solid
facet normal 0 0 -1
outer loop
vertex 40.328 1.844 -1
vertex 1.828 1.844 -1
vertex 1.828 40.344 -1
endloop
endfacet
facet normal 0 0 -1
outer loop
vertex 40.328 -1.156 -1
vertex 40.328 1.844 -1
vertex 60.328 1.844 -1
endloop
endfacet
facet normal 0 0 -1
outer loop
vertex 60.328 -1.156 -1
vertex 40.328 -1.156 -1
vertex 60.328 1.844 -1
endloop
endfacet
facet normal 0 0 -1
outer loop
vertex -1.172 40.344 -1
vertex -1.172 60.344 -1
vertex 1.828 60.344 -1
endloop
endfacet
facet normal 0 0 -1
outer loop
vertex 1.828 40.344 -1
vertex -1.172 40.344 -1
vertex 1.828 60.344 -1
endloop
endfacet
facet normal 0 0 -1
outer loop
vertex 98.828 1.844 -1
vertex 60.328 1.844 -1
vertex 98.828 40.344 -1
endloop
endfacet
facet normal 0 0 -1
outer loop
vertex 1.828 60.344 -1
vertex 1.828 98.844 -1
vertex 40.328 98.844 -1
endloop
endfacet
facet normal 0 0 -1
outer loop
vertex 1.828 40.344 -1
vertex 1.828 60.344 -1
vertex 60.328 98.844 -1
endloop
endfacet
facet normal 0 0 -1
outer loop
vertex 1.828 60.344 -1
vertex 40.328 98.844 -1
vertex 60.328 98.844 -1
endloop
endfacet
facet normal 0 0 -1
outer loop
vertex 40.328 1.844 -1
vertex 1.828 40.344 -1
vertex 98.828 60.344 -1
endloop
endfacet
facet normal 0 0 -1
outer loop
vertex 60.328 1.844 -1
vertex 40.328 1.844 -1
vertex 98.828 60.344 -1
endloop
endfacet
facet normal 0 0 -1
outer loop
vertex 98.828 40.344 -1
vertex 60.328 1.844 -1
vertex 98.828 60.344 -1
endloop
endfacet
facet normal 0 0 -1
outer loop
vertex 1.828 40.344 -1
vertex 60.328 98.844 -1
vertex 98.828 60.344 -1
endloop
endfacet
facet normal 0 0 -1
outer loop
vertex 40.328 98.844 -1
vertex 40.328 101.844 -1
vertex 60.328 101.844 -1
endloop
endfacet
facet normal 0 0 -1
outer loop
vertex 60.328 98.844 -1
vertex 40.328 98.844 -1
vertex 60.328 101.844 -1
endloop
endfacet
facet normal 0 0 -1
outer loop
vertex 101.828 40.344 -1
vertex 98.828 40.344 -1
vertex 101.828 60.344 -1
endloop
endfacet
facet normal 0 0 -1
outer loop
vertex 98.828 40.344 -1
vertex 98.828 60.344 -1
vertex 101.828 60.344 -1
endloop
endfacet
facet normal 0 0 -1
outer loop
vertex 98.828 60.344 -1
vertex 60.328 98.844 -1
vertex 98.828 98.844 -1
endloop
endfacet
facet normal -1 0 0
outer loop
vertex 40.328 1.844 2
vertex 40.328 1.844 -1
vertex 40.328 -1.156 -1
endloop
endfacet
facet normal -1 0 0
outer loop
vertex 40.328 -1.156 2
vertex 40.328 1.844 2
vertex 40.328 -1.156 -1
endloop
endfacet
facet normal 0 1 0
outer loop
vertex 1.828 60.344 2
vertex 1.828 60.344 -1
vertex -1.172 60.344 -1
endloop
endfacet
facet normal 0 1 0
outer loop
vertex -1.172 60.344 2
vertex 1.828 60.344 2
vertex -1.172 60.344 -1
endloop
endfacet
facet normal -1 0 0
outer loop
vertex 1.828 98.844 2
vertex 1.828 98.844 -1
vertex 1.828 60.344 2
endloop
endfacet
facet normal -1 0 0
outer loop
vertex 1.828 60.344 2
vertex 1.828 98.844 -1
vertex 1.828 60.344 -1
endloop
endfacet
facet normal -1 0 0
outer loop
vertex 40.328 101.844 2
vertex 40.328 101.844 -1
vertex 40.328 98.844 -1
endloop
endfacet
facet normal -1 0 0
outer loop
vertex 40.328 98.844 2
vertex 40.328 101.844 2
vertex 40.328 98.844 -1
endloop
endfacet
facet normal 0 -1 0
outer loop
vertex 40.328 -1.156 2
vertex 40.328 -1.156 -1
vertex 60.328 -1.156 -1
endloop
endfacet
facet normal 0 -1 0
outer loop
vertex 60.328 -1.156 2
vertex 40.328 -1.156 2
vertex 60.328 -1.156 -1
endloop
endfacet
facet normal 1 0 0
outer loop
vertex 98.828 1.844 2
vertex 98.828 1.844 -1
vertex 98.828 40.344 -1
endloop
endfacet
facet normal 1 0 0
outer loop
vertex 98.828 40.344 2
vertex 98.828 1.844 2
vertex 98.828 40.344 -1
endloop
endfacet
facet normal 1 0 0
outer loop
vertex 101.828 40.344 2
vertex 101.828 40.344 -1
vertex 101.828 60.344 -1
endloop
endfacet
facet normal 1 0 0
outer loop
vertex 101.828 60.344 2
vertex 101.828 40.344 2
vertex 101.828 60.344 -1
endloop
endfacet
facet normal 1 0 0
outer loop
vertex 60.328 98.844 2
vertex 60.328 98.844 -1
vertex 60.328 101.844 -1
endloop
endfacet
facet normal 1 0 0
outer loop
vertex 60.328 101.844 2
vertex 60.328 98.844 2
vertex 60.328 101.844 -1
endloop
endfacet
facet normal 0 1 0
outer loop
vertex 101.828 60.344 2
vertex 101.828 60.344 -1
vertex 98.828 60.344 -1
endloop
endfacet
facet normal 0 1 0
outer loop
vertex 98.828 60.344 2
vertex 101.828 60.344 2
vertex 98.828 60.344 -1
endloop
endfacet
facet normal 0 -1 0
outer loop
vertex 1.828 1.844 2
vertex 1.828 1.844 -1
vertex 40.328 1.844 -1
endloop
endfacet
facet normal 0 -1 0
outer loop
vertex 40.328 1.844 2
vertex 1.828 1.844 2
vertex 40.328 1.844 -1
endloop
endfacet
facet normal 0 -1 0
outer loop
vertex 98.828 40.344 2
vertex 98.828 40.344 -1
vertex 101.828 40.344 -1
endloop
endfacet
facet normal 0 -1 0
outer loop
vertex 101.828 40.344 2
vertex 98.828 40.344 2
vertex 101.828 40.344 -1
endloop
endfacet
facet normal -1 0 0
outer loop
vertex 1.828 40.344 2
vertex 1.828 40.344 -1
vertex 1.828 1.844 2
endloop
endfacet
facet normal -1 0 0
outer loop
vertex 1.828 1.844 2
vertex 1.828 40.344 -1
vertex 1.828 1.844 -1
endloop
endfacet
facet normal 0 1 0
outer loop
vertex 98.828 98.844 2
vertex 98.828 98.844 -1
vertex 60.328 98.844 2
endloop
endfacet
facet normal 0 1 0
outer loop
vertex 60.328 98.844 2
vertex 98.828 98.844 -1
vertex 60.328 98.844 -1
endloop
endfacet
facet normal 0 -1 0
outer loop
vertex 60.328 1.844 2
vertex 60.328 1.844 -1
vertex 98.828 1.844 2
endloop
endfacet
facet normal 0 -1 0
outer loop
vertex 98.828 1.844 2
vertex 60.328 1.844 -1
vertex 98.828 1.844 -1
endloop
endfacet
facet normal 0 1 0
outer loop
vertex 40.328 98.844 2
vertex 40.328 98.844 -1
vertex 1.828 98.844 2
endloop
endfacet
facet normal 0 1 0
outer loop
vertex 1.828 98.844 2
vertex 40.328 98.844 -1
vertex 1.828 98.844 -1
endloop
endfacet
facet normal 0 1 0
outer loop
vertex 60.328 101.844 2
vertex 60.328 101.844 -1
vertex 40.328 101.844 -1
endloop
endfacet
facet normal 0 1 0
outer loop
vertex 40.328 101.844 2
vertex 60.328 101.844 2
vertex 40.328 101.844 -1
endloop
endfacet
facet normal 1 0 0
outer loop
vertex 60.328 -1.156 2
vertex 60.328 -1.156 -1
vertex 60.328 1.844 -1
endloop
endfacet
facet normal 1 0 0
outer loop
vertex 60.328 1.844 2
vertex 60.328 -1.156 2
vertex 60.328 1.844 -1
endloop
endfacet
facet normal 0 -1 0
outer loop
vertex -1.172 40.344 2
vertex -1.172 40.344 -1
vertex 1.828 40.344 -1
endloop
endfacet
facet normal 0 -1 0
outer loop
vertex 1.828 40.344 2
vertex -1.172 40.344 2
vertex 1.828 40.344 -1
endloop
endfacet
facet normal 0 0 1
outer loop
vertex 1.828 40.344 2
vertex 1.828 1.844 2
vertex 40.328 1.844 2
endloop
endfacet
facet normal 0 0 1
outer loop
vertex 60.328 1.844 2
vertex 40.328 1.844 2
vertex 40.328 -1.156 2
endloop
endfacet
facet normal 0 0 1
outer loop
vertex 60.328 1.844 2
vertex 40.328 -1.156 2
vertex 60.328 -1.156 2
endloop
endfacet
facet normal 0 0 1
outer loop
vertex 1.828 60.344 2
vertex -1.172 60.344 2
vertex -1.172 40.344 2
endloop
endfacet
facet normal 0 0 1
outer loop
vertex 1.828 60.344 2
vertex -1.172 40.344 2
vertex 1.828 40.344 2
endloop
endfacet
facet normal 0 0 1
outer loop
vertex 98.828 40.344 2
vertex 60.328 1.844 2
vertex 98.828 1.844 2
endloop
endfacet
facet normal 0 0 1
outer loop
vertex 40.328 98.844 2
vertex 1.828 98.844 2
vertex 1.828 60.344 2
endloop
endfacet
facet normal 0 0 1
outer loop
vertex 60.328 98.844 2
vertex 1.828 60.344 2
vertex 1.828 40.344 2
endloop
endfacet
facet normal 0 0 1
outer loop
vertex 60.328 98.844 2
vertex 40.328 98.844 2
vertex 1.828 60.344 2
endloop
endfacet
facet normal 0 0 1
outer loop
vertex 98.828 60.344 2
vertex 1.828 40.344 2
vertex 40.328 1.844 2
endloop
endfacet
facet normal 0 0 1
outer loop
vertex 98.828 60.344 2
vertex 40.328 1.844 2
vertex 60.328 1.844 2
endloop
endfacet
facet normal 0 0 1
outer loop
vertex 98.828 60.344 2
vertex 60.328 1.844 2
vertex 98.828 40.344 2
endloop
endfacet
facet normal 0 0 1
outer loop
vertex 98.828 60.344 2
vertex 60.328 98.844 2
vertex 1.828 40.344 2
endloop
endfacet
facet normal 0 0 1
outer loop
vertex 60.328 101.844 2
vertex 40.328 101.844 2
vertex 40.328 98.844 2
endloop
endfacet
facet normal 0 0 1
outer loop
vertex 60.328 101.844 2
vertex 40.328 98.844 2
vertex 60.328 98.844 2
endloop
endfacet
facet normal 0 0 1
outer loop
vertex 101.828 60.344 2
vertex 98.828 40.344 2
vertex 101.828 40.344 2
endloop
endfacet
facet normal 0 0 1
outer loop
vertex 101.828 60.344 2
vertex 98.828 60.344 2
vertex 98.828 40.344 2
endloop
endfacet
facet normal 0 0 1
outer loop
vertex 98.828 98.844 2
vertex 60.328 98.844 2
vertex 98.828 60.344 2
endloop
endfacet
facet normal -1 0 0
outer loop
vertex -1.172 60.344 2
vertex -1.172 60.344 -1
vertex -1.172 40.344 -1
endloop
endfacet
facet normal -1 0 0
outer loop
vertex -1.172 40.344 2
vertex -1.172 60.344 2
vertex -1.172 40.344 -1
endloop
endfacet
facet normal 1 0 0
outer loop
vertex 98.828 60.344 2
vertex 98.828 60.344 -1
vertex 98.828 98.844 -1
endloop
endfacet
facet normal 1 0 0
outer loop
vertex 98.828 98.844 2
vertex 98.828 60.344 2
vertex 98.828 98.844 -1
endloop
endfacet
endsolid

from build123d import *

# Parameters (mm, degrees)
BOSS_EXTRUDE1_DEPTH      = 2
BOSS_EXTRUDE1_DEPTH_BACK = 1


with BuildPart() as part:
    # Sketch1 → Boss-Extrude1 (new, two sides: drawn at the far end of the back side and taken through both)
    with BuildSketch(Plane.XY.offset(-BOSS_EXTRUDE1_DEPTH_BACK)):
        Polygon((98.82804668, 60.344291492), (98.82804668, 98.844291492), (60.32804668, 98.844291492), (60.32804668, 101.844291492), (40.32804668, 101.844291492), (40.32804668, 98.844291492), (1.82804668, 98.844291492), (1.82804668, 60.344291492), (-1.17195332, 60.344291492), (-1.17195332, 40.344291492), (1.82804668, 40.344291492), (1.82804668, 1.844291492), (40.32804668, 1.844291492), (40.32804668, -1.155708508), (60.32804668, -1.155708508), (60.32804668, 1.844291492), (98.82804668, 1.844291492), (98.82804668, 40.344291492), (101.82804668, 40.344291492), (101.82804668, 60.344291492), align=None)
    extrude(amount=BOSS_EXTRUDE1_DEPTH + BOSS_EXTRUDE1_DEPTH_BACK)


solid = part.part
